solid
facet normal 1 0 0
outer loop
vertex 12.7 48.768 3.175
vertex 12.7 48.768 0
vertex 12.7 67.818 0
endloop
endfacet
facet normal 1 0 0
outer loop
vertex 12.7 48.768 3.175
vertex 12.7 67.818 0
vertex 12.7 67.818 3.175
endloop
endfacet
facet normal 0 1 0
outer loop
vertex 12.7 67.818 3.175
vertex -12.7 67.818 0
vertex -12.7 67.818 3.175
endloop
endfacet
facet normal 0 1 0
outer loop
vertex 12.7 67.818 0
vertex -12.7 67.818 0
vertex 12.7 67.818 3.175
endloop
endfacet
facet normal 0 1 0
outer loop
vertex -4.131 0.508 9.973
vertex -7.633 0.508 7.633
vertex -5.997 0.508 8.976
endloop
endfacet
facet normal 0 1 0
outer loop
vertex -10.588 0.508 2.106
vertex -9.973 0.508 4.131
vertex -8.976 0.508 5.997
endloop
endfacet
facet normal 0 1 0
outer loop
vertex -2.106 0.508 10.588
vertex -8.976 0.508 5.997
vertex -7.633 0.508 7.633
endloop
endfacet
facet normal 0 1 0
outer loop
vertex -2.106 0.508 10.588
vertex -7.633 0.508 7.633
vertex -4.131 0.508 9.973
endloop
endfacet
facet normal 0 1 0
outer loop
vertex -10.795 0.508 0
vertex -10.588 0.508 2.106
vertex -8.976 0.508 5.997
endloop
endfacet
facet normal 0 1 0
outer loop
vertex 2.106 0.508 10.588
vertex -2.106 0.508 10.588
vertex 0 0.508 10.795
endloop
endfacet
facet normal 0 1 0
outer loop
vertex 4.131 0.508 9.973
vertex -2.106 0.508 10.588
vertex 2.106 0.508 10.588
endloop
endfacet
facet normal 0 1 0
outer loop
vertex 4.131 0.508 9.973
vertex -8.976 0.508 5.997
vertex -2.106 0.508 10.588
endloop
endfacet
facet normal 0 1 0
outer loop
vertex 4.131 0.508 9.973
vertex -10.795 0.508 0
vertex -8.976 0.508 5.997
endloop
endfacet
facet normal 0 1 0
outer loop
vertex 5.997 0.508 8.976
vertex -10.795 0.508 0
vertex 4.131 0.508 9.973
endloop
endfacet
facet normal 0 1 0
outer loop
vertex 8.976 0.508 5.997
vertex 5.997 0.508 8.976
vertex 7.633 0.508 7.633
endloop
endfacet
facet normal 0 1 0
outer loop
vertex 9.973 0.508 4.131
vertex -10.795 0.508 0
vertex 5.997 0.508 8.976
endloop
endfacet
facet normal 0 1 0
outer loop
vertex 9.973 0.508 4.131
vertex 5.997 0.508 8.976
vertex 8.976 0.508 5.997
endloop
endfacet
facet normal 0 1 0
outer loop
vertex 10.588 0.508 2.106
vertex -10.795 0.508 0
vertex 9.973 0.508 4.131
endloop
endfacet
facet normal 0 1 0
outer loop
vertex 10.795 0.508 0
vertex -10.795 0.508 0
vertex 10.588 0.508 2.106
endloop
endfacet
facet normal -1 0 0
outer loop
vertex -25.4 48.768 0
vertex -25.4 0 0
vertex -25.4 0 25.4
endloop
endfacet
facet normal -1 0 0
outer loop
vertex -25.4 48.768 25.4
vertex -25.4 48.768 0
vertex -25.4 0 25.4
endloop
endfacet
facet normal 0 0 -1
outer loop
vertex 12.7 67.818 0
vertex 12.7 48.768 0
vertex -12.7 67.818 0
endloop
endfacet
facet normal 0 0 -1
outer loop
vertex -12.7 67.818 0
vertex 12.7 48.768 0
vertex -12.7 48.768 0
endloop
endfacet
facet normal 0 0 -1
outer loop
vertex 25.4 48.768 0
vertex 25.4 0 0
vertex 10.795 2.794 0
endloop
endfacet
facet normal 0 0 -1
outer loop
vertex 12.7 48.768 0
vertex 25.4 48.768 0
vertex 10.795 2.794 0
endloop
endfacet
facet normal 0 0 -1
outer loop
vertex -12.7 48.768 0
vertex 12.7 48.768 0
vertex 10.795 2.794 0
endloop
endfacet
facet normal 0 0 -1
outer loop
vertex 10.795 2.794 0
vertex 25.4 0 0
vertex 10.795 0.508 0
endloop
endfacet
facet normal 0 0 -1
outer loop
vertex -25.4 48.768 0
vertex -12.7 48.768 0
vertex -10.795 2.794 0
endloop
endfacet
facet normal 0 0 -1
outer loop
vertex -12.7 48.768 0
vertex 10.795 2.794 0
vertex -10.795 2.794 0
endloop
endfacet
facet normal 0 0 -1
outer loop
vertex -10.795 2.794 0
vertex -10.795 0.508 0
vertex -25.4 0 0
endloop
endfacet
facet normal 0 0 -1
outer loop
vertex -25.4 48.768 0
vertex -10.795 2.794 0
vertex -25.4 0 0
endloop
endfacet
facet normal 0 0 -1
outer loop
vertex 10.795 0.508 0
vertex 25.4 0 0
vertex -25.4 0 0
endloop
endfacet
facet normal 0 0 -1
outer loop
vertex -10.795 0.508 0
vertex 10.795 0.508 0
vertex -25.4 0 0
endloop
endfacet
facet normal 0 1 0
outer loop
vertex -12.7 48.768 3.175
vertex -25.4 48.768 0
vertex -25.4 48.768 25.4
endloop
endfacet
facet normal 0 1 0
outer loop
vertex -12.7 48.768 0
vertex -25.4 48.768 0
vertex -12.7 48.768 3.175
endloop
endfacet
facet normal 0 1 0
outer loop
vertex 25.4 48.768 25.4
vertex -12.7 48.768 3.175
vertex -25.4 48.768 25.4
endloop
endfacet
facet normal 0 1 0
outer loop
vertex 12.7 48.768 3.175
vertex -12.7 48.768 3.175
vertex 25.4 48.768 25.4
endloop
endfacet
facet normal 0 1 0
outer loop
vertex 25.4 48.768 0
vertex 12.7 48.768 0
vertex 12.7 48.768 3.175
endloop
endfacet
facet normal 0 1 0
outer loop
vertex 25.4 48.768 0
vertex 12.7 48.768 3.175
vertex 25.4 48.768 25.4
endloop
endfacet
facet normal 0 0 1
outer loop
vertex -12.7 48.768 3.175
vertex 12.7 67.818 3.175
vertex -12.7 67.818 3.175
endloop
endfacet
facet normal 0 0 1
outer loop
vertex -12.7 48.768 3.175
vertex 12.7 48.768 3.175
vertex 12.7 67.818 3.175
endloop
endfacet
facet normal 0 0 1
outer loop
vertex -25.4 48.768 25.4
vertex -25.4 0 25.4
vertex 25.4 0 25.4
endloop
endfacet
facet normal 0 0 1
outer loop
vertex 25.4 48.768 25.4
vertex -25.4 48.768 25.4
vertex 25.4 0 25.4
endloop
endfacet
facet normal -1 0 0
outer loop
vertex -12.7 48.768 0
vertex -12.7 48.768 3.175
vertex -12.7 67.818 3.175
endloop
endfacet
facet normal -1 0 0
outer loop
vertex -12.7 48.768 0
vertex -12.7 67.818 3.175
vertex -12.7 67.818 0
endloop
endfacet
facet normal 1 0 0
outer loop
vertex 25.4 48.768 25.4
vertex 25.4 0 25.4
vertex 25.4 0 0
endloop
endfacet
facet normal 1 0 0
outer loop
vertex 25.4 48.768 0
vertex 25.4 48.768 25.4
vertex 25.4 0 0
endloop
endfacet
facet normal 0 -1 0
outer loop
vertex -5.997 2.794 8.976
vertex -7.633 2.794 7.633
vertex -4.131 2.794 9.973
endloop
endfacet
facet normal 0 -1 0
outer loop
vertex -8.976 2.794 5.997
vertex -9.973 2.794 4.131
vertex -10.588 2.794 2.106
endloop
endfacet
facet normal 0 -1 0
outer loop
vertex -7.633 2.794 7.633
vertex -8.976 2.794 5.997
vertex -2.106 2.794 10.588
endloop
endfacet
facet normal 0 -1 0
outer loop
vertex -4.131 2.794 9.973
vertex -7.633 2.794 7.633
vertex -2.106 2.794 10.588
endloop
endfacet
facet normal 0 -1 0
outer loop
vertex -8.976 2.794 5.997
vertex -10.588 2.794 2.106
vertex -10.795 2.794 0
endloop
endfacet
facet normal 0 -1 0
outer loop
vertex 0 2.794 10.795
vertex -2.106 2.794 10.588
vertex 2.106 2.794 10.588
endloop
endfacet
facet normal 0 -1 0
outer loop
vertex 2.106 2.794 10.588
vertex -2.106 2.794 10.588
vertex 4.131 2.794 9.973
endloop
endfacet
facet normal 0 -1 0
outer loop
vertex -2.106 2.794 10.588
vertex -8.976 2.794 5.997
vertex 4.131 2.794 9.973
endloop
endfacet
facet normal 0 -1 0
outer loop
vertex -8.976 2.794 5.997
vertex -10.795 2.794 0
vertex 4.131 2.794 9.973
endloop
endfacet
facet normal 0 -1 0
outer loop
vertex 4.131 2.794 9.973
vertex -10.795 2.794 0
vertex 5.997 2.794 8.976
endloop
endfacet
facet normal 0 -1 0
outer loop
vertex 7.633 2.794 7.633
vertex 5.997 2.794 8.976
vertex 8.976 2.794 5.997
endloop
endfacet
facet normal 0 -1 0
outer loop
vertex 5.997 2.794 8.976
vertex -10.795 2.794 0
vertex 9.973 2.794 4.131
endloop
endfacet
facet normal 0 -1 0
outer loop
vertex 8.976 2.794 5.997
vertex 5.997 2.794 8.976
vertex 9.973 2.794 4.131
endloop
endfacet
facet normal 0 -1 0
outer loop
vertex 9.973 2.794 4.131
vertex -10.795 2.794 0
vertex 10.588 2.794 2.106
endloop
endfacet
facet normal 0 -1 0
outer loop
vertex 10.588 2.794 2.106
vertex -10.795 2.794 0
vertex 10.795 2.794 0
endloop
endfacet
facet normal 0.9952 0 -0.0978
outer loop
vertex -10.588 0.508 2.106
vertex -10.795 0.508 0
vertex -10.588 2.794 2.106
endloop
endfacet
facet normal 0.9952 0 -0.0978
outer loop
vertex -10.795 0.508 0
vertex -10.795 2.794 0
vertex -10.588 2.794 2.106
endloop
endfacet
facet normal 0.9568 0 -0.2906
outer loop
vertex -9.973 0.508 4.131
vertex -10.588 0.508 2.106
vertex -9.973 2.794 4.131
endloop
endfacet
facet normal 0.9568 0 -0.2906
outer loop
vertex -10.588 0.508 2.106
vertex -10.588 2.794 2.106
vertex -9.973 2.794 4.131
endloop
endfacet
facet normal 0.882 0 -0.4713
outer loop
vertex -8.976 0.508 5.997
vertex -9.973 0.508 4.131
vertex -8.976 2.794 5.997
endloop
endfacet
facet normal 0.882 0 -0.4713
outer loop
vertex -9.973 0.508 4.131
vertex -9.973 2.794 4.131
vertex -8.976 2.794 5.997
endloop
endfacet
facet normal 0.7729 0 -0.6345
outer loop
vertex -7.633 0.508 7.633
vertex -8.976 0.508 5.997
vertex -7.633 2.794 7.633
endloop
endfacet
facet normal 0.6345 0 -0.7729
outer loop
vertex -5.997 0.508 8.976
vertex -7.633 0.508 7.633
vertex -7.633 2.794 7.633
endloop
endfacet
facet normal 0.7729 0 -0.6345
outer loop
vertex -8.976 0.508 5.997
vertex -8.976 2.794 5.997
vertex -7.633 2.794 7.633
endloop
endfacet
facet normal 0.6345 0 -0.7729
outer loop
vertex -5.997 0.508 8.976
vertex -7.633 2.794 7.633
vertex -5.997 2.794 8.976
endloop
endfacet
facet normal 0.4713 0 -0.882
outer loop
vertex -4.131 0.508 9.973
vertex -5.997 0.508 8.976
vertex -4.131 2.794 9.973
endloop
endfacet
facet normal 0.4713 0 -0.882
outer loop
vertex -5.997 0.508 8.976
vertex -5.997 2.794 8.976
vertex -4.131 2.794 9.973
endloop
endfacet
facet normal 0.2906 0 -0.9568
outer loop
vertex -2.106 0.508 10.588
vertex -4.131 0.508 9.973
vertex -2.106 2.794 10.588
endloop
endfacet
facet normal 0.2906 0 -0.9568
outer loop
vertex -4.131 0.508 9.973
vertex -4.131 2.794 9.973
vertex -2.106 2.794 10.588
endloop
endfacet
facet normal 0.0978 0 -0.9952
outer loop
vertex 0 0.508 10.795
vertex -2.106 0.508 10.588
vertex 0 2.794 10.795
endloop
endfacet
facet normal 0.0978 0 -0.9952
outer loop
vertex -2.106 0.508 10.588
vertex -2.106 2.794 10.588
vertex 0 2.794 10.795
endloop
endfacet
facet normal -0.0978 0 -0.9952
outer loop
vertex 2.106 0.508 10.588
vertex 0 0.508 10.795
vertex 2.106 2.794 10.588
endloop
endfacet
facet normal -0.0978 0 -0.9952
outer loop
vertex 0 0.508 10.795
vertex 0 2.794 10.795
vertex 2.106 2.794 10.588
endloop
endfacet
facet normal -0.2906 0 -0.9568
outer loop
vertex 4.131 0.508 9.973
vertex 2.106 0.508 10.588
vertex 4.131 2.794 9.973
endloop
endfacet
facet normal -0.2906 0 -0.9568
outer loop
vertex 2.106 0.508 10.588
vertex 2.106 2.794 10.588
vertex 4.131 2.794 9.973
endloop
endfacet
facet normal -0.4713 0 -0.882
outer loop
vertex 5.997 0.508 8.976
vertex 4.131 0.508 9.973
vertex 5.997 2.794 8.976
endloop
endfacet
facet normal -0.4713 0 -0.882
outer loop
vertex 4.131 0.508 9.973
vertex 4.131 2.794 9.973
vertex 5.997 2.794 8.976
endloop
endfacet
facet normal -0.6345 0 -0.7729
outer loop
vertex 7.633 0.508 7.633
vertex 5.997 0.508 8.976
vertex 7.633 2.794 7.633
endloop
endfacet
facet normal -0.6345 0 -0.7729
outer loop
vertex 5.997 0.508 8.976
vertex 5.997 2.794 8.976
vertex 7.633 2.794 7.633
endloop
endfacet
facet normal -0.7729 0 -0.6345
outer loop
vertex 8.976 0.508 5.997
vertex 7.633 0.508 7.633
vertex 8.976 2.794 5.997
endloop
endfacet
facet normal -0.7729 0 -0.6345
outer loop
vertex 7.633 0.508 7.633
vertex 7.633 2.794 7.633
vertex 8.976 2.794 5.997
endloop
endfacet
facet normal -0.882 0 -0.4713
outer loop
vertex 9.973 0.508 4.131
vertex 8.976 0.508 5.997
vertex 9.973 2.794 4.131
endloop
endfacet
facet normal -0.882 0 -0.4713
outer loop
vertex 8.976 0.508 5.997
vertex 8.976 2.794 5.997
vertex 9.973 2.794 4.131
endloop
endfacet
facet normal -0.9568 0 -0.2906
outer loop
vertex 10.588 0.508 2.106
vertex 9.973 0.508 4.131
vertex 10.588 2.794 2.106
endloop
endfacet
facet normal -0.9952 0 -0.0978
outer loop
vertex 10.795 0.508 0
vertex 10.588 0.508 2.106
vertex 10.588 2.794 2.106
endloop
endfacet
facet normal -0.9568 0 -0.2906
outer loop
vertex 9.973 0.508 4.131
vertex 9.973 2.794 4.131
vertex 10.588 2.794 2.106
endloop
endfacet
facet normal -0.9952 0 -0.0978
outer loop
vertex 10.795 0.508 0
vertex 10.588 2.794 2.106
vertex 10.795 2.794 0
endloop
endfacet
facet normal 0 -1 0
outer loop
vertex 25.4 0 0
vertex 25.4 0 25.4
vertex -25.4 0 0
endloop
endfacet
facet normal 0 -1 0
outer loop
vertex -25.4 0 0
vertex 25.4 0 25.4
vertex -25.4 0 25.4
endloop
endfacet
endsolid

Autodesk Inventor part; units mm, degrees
ref_plane "YZ Plane" through (0, 0, 0) normal (1, 0, 0) x (0, 1, 0)
ref_plane "XZ Plane" through (0, 0, 0) normal (0, 1, 0) x (-1, 0, 0)
ref_plane "XY Plane" through (0, 0, 0) normal (0, 0, 1) x (1, 0, 0)
sketch "Sketch1" plane through (0, 0, 0) normal (0, 1, 0) x (-1, 0, 0)
  line L0 (25.4, 0) -> (-25.4, 0)
  line L1 (-25.4, 0) -> (-25.4, 25.4)
  line L2 (-25.4, 25.4) -> (25.4, 25.4)
  line L3 (25.4, 25.4) -> (25.4, 0)
  point P0 (0, 0)
  dimension "d0" = 50.8
  dimension "d1" = 25.4
extrude "Extrusion1" add sketch "Sketch1" along normal blind 2.794
sketch "Sketch2" plane through (0, 2.794, 0) normal (0, 1, 0) x (1, 0, 0)
  circle A0 centre (0, 0) radius 10.795
  dimension "d4" = 21.59
extrude "Extrusion2" cut sketch "Sketch2" against normal blind 2.286
sketch "Sketch3" plane through (0, 2.794, 0) normal (0, 1, 0) x (1, 0, 0)
  line L0 (-25.4, -25.4) -> (25.4, -25.4) projected
  line L1 (-25.4, -25.4) -> (25.4, -25.4)
  line L2 (25.4, -25.4) -> (25.4, 0)
  line L3 (25.4, 0) -> (-25.4, 0)
  line L4 (-25.4, 0) -> (-25.4, -25.4)
  point P0 (0, 0)
extrude "Extrusion3" add sketch "Sketch3" along normal blind 45.974
sketch "Sketch4" plane through (0, 48.768, 0) normal (0, 1, 0) x (1, 0, 0)
  line L0 (12.7, -3.175) -> (-12.7, -3.175)
  line L1 (-12.7, -3.175) -> (-12.7, 0)
  line L2 (-12.7, 0) -> (12.7, 0)
  line L3 (12.7, 0) -> (12.7, -3.175)
  point P0 (0, 0)
  dimension "d9" = 25.4
  dimension "d10" = 3.175
extrude "Extrusion4" add sketch "Sketch4" along normal blind 19.05
properties part number "half a block for magnet"
